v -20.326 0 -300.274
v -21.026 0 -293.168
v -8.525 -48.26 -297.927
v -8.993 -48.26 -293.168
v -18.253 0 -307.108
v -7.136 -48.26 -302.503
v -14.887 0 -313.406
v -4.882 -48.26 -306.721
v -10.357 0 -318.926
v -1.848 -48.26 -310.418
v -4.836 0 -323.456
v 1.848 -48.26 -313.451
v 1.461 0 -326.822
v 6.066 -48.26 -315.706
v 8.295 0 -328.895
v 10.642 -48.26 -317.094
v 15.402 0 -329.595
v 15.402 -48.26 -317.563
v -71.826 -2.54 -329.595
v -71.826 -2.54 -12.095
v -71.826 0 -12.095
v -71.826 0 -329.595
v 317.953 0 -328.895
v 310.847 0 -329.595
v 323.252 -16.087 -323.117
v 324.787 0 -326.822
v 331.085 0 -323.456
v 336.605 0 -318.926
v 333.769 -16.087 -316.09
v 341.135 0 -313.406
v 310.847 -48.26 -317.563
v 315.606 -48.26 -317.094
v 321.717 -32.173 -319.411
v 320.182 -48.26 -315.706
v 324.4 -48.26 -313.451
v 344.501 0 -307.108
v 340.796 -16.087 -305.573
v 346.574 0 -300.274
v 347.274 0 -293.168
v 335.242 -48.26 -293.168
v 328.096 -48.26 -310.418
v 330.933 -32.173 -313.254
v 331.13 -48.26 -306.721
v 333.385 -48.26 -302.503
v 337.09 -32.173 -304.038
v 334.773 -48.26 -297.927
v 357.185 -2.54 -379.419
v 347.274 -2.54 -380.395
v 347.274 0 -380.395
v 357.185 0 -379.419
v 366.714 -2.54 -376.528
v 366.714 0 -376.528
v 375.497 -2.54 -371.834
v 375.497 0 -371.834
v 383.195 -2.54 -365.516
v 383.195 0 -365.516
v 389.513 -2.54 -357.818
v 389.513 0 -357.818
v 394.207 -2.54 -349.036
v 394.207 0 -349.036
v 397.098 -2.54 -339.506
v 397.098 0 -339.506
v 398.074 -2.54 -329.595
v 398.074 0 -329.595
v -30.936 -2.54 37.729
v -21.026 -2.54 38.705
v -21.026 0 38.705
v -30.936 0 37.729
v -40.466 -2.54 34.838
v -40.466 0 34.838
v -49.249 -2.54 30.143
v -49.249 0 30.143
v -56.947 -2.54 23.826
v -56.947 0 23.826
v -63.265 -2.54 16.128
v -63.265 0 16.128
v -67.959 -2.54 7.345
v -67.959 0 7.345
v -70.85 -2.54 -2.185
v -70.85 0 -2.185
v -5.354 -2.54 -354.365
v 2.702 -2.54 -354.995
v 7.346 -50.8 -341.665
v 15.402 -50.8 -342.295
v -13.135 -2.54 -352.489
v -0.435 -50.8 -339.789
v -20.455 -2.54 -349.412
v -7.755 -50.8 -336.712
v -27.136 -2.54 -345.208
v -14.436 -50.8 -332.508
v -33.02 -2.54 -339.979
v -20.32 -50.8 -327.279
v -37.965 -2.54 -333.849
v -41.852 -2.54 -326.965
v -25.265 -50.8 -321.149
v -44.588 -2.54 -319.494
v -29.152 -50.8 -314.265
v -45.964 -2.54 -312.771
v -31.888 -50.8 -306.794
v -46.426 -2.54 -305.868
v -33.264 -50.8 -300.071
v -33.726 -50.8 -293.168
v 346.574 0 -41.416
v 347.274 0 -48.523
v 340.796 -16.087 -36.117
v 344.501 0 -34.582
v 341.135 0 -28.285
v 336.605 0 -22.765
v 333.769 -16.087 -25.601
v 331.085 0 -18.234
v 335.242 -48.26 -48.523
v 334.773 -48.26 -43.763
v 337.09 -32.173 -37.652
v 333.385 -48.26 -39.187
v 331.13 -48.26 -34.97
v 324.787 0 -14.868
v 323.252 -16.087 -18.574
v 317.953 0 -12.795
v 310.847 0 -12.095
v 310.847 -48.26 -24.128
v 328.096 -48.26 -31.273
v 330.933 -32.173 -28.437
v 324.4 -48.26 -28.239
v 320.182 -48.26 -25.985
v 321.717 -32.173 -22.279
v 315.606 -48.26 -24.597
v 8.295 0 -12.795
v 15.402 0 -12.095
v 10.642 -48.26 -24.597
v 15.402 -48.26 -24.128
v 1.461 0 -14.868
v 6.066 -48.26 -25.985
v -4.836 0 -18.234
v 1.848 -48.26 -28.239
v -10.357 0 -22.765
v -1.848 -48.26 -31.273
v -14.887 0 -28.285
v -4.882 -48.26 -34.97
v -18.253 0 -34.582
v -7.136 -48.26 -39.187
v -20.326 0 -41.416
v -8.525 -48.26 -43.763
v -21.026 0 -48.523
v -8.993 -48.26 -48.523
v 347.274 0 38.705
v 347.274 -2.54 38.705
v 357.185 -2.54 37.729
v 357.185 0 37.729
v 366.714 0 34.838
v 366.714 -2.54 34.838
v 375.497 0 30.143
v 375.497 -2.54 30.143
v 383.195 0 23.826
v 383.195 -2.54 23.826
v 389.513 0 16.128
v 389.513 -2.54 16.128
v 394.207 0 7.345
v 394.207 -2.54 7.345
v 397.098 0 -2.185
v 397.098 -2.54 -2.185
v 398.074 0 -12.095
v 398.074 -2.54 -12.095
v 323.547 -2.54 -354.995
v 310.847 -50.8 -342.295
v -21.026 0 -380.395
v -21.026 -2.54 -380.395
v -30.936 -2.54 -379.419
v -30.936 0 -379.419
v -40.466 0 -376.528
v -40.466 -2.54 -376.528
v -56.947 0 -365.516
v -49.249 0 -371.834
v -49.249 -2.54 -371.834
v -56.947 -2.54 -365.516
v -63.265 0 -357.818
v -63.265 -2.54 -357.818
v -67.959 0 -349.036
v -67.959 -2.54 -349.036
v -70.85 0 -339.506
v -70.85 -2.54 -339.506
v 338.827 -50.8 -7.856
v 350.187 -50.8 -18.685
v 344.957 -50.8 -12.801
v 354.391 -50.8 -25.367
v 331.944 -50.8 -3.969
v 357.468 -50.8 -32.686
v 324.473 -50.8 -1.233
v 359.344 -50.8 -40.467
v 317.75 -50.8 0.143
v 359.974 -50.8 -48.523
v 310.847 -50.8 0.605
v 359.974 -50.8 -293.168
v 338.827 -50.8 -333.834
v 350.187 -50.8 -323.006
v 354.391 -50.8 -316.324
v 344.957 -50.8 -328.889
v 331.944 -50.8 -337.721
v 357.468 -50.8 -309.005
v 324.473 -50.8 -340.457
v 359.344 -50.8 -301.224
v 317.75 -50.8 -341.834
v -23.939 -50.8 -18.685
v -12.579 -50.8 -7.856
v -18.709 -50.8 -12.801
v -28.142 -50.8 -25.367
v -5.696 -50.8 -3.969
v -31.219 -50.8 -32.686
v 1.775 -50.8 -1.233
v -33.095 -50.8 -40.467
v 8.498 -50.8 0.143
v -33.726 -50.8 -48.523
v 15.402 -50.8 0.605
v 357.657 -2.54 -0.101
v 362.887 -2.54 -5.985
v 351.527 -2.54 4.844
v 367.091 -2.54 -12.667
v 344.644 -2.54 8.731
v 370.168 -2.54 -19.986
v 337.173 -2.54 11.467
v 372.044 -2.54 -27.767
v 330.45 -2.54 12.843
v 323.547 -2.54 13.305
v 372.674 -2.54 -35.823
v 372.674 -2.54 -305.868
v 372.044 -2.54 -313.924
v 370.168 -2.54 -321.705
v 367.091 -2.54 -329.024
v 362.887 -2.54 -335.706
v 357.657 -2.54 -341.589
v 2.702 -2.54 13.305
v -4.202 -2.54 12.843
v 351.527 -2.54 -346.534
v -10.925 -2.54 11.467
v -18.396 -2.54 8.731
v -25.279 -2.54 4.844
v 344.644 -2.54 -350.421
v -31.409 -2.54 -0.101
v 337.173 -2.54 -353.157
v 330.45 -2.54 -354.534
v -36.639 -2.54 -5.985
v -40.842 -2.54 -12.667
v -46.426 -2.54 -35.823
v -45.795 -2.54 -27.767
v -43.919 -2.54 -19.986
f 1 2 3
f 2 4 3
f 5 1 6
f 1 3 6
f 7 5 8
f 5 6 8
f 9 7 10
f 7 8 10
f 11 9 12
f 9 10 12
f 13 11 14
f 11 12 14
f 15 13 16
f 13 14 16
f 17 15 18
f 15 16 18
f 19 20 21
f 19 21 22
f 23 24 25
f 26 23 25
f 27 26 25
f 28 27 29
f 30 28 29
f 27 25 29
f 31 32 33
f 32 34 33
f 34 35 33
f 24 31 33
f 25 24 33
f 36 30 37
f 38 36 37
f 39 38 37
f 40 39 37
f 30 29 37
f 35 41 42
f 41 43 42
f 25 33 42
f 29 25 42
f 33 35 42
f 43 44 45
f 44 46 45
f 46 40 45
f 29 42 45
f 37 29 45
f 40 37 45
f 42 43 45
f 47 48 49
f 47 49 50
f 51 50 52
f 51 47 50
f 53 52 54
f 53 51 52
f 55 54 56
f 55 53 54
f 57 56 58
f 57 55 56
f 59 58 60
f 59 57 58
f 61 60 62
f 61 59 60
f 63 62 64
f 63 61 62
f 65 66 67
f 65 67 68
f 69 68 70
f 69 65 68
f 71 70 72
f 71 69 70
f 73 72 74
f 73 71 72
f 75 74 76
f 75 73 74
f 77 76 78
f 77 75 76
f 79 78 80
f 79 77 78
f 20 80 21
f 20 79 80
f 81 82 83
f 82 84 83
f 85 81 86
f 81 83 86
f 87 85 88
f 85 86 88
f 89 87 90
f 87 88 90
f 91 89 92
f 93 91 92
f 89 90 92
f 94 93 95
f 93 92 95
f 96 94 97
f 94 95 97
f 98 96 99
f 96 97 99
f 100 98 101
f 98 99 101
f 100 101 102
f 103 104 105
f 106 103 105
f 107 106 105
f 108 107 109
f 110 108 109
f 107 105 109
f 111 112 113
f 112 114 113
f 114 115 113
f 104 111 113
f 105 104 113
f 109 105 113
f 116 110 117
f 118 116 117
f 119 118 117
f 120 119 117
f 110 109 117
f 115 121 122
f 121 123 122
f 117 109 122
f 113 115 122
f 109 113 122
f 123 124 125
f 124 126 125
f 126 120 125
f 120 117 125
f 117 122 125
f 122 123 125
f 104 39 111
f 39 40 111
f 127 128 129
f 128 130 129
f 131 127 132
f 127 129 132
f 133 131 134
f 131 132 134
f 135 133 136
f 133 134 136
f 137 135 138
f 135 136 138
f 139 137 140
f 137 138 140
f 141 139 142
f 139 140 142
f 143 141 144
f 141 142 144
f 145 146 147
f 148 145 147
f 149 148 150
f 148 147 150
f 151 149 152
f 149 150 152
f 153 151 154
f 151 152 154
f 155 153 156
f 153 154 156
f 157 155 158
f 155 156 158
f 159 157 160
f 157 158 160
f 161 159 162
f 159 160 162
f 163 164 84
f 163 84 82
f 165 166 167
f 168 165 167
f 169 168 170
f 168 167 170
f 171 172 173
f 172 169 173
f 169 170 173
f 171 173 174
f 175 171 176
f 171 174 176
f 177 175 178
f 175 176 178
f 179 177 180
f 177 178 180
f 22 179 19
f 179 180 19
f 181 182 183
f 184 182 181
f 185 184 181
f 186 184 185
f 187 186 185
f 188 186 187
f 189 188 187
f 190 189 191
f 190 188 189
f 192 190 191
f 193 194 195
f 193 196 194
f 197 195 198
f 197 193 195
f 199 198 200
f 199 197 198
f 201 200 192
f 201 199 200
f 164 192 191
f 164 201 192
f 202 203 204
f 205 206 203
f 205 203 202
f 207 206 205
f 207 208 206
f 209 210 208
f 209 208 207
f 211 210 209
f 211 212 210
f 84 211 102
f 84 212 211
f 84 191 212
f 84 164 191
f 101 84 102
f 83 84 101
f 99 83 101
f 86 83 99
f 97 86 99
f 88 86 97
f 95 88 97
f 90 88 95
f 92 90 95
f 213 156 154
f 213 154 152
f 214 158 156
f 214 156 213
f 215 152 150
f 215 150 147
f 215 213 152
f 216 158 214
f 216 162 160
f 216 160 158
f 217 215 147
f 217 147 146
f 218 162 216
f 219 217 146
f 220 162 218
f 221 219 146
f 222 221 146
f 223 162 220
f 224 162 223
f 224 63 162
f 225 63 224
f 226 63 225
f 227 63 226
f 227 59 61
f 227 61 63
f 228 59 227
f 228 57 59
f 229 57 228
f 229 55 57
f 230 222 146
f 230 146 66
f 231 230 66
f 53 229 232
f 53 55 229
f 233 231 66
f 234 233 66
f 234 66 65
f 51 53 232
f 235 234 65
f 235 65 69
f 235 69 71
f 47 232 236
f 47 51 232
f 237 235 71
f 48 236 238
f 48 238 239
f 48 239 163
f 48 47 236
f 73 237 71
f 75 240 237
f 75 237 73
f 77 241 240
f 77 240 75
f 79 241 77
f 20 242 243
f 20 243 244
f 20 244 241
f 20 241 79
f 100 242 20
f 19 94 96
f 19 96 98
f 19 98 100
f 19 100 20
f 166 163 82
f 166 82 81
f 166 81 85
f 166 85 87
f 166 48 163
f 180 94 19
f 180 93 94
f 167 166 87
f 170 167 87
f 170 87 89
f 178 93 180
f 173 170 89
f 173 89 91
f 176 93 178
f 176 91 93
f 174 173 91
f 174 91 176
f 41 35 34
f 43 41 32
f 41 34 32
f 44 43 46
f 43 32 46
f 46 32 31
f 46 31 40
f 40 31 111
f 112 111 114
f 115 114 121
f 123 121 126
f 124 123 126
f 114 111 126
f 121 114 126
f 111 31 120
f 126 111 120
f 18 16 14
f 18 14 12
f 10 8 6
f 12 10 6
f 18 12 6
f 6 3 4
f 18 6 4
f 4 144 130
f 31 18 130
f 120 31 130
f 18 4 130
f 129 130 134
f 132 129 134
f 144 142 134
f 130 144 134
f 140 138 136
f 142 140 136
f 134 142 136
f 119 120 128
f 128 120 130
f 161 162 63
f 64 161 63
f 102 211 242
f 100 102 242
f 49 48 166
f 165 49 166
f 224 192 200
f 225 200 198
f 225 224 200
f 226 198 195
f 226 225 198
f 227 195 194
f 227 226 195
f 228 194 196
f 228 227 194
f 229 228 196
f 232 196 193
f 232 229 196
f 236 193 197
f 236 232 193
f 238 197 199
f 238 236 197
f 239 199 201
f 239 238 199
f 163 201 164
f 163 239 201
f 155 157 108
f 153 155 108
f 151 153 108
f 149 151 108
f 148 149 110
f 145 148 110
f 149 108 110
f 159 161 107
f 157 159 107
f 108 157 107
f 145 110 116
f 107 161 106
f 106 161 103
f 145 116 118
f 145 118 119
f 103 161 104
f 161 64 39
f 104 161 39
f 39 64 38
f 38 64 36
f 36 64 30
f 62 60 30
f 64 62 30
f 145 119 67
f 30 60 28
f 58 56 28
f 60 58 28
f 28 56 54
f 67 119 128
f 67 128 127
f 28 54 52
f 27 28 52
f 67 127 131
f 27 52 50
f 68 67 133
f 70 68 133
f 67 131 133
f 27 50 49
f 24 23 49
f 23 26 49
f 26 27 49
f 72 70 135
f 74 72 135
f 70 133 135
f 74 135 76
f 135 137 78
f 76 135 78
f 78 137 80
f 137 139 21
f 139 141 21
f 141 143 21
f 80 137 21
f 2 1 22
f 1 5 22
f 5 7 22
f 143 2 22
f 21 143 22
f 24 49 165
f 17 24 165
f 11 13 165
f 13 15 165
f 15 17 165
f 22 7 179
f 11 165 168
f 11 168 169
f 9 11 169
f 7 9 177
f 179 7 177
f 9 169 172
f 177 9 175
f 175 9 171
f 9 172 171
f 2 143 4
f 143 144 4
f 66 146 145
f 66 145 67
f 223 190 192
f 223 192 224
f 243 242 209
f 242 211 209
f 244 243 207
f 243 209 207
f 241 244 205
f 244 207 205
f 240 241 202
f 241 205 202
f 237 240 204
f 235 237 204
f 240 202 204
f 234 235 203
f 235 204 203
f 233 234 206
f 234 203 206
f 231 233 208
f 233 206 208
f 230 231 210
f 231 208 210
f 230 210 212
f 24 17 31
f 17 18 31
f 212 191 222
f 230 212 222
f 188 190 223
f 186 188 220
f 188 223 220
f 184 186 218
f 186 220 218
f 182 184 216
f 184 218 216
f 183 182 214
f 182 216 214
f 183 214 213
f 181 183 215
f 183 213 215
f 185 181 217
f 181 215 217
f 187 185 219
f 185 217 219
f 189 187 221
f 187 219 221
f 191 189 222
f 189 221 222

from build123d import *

# Parameters (mm, degrees)
SKETCH8_W                = 469.9
SKETCH8_H                = 419.1
BOSS_EXTRUDE1_DEPTH      = 50.8
CUT_EXTRUDE3_DEPTH       = 48.26
CUT_EXTRUDE4_DEPTH       = 48.26
CUT_EXTRUDE5_DEPTH       = 48.26
CUT_EXTRUDE6_DEPTH       = 48.26
CUT_EXTRUDE7_DEPTH       = 416.052
CUT_EXTRUDE8_DEPTH       = 69.342
CUT_EXTRUDE9_DEPTH       = 104.902
CUT_EXTRUDE9_DEPTH_BACK  = 516.128
CUT_EXTRUDE10_DEPTH      = 483.87
CUT_EXTRUDE10_DEPTH_BACK = 154.432
CUT_EXTRUDE11_DEPTH      = 419.608
CUT_EXTRUDE11_DEPTH_BACK = 113.03
FILLET1_R                = 50.8
FILLET2_R                = 50.8
FILLET3_R                = 50.8
FILLET4_R                = 50.8
CUT_EXTRUDE12_DEPTH      = 113.03
CUT_EXTRUDE13_DEPTH      = 113.03
CUT_EXTRUDE14_DEPTH      = 113.03
CUT_EXTRUDE15_DEPTH      = 113.03
CUT_EXTRUDE18_DEPTH      = 48.26
CUT_EXTRUDE18_TAPER      = 14
BODY_MOVE_COPY1_ANGLE    = 180


with BuildPart() as part:
    # Sketch8 → Boss-Extrude1 (new body)
    with BuildSketch(Plane(origin=(0, 0, 0), x_dir=(1, 0, 0), z_dir=(0, 1, 0))):
        with Locations((163.124113973, 170.845238095)):
            Rectangle(SKETCH8_W, SKETCH8_H)
    extrude(amount=-BOSS_EXTRUDE1_DEPTH)

    # Sketch9 → Cut-Extrude3 (cut)
    with BuildSketch(Plane(origin=(0, 0, 0), x_dir=(1, 0, 0), z_dir=(0, 1, 0))):
        Polygon((-46.425886027, -13.304761905), (372.674113973, -13.304761905), (398.074113973, -38.704761905), (-71.825886027, -38.704761905), align=None)
    extrude(amount=-CUT_EXTRUDE3_DEPTH, mode=Mode.SUBTRACT)

    # Sketch11 → Cut-Extrude4 (cut)
    with BuildSketch(Plane(origin=(0, 0, 0), x_dir=(1, 0, 0), z_dir=(0, 1, 0))):
        Polygon((-46.425886027, 354.995238095), (-46.425886027, -13.304761905), (-71.825886027, -38.704761905), (-71.825886027, 380.395238095), align=None)
    extrude(amount=-CUT_EXTRUDE4_DEPTH, mode=Mode.SUBTRACT)

    # Sketch13 → Cut-Extrude5 (cut)
    with BuildSketch(Plane(origin=(0, 0, 0), x_dir=(1, 0, 0), z_dir=(0, 1, 0))):
        Polygon((-46.425886027, 354.995238095), (372.674113973, 354.995238095), (398.074113973, 380.395238095), (-71.825886027, 380.395238095), align=None)
    extrude(amount=-CUT_EXTRUDE5_DEPTH, mode=Mode.SUBTRACT)

    # Sketch14 → Cut-Extrude6 (cut)
    with BuildSketch(Plane(origin=(0, 0, 0), x_dir=(1, 0, 0), z_dir=(0, 1, 0))):
        Polygon((398.074113973, 380.395238095), (372.674113973, 354.995238095), (372.674113973, -13.304761905), (398.074113973, -38.704761905), align=None)
    extrude(amount=-CUT_EXTRUDE6_DEPTH, mode=Mode.SUBTRACT)

    # Sketch16 → Cut-Extrude7 (cut)
    with BuildSketch(Plane.XY):
        Polygon((-46.425886027, 0), (-33.725886027, 0), (-46.425886027, -48.26), align=None)
    extrude(amount=-CUT_EXTRUDE7_DEPTH, mode=Mode.SUBTRACT)

    # Sketch17 → Cut-Extrude8 (cut)
    with BuildSketch(Plane.XY):
        Polygon((-33.725886027, 0), (-46.425886027, 0), (-46.425886027, -48.26), align=None)
    extrude(amount=CUT_EXTRUDE8_DEPTH, mode=Mode.SUBTRACT)

    # Sketch18 → Cut-Extrude9 (cut, two sides: drawn at the far end of the back side and taken through both)
    with BuildSketch(Plane.XY.offset(-CUT_EXTRUDE9_DEPTH_BACK)):
        Polygon((372.674113973, 0), (359.974113973, 0), (372.674113973, -48.26), align=None)
    extrude(amount=CUT_EXTRUDE9_DEPTH + CUT_EXTRUDE9_DEPTH_BACK, mode=Mode.SUBTRACT)

    # Sketch19 → Cut-Extrude10 (cut, two sides: drawn at the far end of the back side and taken through both)
    with BuildSketch(Plane(origin=(0, 0, 0), x_dir=(0, 0, -1), z_dir=(1, 0, 0)).offset(-CUT_EXTRUDE10_DEPTH_BACK)):
        Polygon((-13.304761905, 0), (-0.604761905, 0), (-13.304761905, -48.26), align=None)
    extrude(amount=CUT_EXTRUDE10_DEPTH + CUT_EXTRUDE10_DEPTH_BACK, mode=Mode.SUBTRACT)

    # Sketch20 → Cut-Extrude11 (cut, two sides: drawn at the far end of the back side and taken through both)
    with BuildSketch(Plane(origin=(0, 0, 0), x_dir=(0, 0, -1), z_dir=(1, 0, 0)).offset(-CUT_EXTRUDE11_DEPTH_BACK)):
        Polygon((354.995238095, 0), (342.295238095, 0), (354.995238095, -48.26), align=None)
    extrude(amount=CUT_EXTRUDE11_DEPTH + CUT_EXTRUDE11_DEPTH_BACK, mode=Mode.SUBTRACT)

    # Fillet1
    fillet1_edges = [part.edges().sort_by_distance(p)[0] for p in [
        (-40.075886027, -24.13, 6.954761905),
    ]]
    fillet(fillet1_edges, radius=FILLET1_R)

    # Fillet2
    fillet2_edges = [part.edges().sort_by_distance(p)[0] for p in [
        (-40.075886027, -24.13, -348.645238095),
    ]]
    fillet(fillet2_edges, radius=FILLET2_R)

    # Fillet3
    fillet3_edges = [part.edges().sort_by_distance(p)[0] for p in [
        (366.324113973, -24.13, -348.645238095),
    ]]
    fillet(fillet3_edges, radius=FILLET3_R)

    # Fillet4
    fillet4_edges = [part.edges().sort_by_distance(p)[0] for p in [
        (366.324113973, -24.13, 6.954761905),
    ]]
    fillet(fillet4_edges, radius=FILLET4_R)

    # Sketch24 → Cut-Extrude12 (cut)
    with BuildSketch(Plane(origin=(0, 0, 0), x_dir=(1, 0, 0), z_dir=(0, 1, 0))):
        with BuildLine():
            Line((-71.825886027, -38.704761905), (-21.025886027, -38.704761905))
            ThreePointArc((-21.025886027, -38.704761905), (-56.946910511, -23.825786389), (-71.825886027, 12.095238095))
            Line((-71.825886027, 12.095238095), (-71.825886027, -38.704761905))
        make_face()
    extrude(amount=-CUT_EXTRUDE12_DEPTH, mode=Mode.SUBTRACT)

    # Sketch25 → Cut-Extrude13 (cut)
    with BuildSketch(Plane(origin=(0, 0, 0), x_dir=(1, 0, 0), z_dir=(0, 1, 0))):
        with BuildLine():
            Line((-71.825886027, 380.395238095), (-21.025886027, 380.395238095))
            ThreePointArc((-21.025886027, 380.395238095), (-56.946910511, 365.51626258), (-71.825886027, 329.595238095))
            Line((-71.825886027, 329.595238095), (-71.825886027, 380.395238095))
        make_face()
    extrude(amount=-CUT_EXTRUDE13_DEPTH, mode=Mode.SUBTRACT)

    # Sketch26 → Cut-Extrude14 (cut)
    with BuildSketch(Plane(origin=(0, 0, 0), x_dir=(1, 0, 0), z_dir=(0, 1, 0))):
        with BuildLine():
            Line((398.074113973, 380.395238095), (347.274113973, 380.395238095))
            ThreePointArc((347.274113973, 380.395238095), (383.195138458, 365.51626258), (398.074113973, 329.595238095))
            Line((398.074113973, 329.595238095), (398.074113973, 380.395238095))
        make_face()
    extrude(amount=-CUT_EXTRUDE14_DEPTH, mode=Mode.SUBTRACT)

    # Sketch27 → Cut-Extrude15 (cut)
    with BuildSketch(Plane(origin=(0, 0, 0), x_dir=(1, 0, 0), z_dir=(0, 1, 0))):
        with BuildLine():
            Line((398.074113973, -38.704761905), (347.274113973, -38.704761905))
            ThreePointArc((347.274113973, -38.704761905), (383.195138458, -23.825786389), (398.074113973, 12.095238095))
            Line((398.074113973, 12.095238095), (398.074113973, -38.704761905))
        make_face()
    extrude(amount=-CUT_EXTRUDE15_DEPTH, mode=Mode.SUBTRACT)

    # Sketch29 → Cut-Extrude18 (cut)
    with BuildSketch(Plane(origin=(0, -50.8, 0), x_dir=(1, 0, 0), z_dir=(0, 1, 0))):
        with BuildLine():
            ThreePointArc((310.846727481, 12.095238095), (336.604779491, 22.764572578), (347.274113973, 48.522624588))
            Line((347.274113973, 48.522624588), (347.274113973, 293.167851602))
            ThreePointArc((347.274113973, 293.167851602), (336.604779491, 318.925903612), (310.846727481, 329.595238095))
            Line((310.846727481, 329.595238095), (15.401500466, 329.595238095))
            ThreePointArc((15.401500466, 329.595238095), (-10.356551544, 318.925903612), (-21.025886027, 293.167851602))
            Line((-21.025886027, 293.167851602), (-21.025886027, 48.522624588))
            ThreePointArc((-21.025886027, 48.522624588), (-10.356551544, 22.764572578), (15.401500466, 12.095238095))
            Line((15.401500466, 12.095238095), (310.846727481, 12.095238095))
        make_face()
    extrude(amount=CUT_EXTRUDE18_DEPTH, taper=CUT_EXTRUDE18_TAPER, mode=Mode.SUBTRACT)


with BuildPart() as part_1:
    # Body-Move/Copy1: moved
    add(part.part.rotate(Axis((163.124113973, -25.4, 0), (0, 0, 1)), BODY_MOVE_COPY1_ANGLE))


solid = part_1.part
